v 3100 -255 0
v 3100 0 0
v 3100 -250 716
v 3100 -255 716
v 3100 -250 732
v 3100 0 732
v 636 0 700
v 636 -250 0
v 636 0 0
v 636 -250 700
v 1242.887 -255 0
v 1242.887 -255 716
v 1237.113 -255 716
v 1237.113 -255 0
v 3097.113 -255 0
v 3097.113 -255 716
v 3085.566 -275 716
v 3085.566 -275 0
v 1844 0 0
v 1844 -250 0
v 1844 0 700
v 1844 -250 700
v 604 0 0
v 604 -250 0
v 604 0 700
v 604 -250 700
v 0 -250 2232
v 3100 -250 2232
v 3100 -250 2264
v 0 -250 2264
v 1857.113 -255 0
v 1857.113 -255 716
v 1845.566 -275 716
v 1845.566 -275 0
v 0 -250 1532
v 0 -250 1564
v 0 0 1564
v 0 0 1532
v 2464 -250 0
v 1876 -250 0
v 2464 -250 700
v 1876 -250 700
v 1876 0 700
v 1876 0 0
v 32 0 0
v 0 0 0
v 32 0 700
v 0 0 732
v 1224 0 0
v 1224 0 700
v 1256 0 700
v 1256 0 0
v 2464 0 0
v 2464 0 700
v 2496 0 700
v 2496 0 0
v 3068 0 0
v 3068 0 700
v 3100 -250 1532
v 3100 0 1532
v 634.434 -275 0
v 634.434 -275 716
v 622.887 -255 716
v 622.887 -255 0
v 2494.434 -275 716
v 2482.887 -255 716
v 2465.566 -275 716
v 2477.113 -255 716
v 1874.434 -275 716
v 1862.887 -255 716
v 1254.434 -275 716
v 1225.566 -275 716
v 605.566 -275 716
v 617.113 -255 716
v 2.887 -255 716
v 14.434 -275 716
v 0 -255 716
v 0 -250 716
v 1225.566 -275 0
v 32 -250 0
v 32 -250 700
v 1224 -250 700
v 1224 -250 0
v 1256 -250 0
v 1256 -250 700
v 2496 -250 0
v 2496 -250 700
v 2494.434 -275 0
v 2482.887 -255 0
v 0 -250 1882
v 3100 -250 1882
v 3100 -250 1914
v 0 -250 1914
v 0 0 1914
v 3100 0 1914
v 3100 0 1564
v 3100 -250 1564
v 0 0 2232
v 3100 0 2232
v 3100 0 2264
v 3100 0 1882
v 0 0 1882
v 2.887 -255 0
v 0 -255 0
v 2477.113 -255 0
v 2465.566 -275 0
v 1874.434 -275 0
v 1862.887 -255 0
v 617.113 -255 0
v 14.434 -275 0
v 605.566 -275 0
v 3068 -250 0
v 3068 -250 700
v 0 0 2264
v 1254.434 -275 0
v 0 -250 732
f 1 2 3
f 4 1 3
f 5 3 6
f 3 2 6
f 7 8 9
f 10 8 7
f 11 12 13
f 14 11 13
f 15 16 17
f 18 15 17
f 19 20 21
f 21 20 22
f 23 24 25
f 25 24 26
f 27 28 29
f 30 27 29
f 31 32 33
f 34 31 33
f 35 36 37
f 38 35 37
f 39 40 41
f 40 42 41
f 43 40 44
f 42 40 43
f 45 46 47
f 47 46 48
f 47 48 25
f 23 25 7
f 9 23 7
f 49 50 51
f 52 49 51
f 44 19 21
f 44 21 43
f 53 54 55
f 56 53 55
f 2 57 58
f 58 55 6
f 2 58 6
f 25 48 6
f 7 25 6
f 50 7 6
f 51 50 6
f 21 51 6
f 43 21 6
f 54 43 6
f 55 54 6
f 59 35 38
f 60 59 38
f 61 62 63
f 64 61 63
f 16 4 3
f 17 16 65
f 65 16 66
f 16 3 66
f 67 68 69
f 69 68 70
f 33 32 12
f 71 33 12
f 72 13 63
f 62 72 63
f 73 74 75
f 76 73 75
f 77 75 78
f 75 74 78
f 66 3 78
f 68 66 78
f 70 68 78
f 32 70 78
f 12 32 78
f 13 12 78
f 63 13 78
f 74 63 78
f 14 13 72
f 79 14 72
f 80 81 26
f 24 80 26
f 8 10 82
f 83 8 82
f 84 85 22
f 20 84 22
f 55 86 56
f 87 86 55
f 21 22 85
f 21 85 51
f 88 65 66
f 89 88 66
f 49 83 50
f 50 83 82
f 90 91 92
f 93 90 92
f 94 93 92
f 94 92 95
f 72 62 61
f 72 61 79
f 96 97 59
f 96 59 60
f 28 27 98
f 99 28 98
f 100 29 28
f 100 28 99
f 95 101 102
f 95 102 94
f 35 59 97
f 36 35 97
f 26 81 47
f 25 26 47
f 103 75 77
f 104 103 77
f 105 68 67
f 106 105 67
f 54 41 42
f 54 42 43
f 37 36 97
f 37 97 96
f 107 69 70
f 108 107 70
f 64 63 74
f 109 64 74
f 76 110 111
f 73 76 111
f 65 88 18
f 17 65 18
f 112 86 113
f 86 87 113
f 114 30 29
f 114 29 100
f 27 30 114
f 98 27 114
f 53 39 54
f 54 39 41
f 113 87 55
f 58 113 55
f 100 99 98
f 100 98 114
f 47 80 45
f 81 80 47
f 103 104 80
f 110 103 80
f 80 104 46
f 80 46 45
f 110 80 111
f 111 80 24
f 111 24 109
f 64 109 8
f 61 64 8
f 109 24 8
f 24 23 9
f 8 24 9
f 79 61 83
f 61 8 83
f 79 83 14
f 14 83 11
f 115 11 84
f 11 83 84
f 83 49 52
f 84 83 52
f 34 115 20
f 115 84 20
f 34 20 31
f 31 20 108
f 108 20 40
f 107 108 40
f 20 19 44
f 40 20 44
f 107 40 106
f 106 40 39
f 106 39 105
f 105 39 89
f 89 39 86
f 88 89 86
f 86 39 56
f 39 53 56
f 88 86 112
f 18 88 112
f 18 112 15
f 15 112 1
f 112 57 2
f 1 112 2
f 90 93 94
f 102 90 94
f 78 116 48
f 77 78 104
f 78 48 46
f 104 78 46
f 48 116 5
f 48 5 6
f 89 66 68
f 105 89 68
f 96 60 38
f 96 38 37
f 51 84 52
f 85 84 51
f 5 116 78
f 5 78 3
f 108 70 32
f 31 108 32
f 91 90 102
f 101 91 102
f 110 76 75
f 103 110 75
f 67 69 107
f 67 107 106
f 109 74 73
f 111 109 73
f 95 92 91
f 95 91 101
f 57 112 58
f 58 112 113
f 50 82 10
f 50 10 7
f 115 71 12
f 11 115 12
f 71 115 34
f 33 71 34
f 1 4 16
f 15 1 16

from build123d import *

# Parameters (mm, degrees)
F0_W     = 250
F0_H     = 32
F1_DEPTH = 3100
F2_W     = 32
F2_H     = 700
F2_W_2   = 16
F3_DEPTH = 250
F2_H_2   = 16
F2_W_3   = 572
F2_W_4   = 588
F4_DEPTH = 25
F6_DEPTH = 716


with BuildPart() as f1:
    # F0 (on Right) → F1 (new body)
    with BuildSketch(Plane.YZ):
        with Locations((-125, 716)):
            Rectangle(F0_W, F0_H)
    extrude(amount=F1_DEPTH)

    # F2 (on face) → F3 (join, through all)
    with BuildSketch(Plane.XZ.offset(250)):
        with Locations((16, 350)):
            Rectangle(F2_W, F2_H)
        with Locations((612, 350)):
            Rectangle(F2_W_2, F2_H)
        with Locations((628, 350)):
            Rectangle(F2_W_2, F2_H)
        with Locations((1232, 350)):
            Rectangle(F2_W_2, F2_H)
        with Locations((1248, 350)):
            Rectangle(F2_W_2, F2_H)
        with Locations((1868, 350)):
            Rectangle(F2_W_2, F2_H)
        with Locations((1852, 350)):
            Rectangle(F2_W_2, F2_H)
        with Locations((2488, 350)):
            Rectangle(F2_W_2, F2_H)
        with Locations((2472, 350)):
            Rectangle(F2_W_2, F2_H)
        with Locations((3084, 350)):
            Rectangle(F2_W, F2_H)
    extrude(amount=-F3_DEPTH)

    # F2 (on face) → F4 (join)
    with BuildSketch(Plane.XZ.offset(250)):
        with Locations((16, 350)):
            Rectangle(F2_W, F2_H)
        with Locations((16, 708)):
            Rectangle(F2_W, F2_H_2)
        with Locations((318, 708)):
            Rectangle(F2_W_3, F2_H_2)
        with Locations((318, 350)):
            Rectangle(F2_W_3, F2_H)
        with Locations((612, 350)):
            Rectangle(F2_W_2, F2_H)
        with Locations((612, 708)):
            Rectangle(F2_W_2, F2_H_2)
        with Locations((930, 350)):
            Rectangle(F2_W_4, F2_H)
        with Locations((628, 350)):
            Rectangle(F2_W_2, F2_H)
        with Locations((628, 708)):
            Rectangle(F2_W_2, F2_H_2)
        with Locations((930, 708)):
            Rectangle(F2_W_4, F2_H_2)
        with Locations((1232, 708)):
            Rectangle(F2_W_2, F2_H_2)
        with Locations((1232, 350)):
            Rectangle(F2_W_2, F2_H)
        with Locations((1248, 350)):
            Rectangle(F2_W_2, F2_H)
        with Locations((1248, 708)):
            Rectangle(F2_W_2, F2_H_2)
        with Locations((1550, 708)):
            Rectangle(F2_W_4, F2_H_2)
        with Locations((1550, 350)):
            Rectangle(F2_W_4, F2_H)
        with Locations((1852, 708)):
            Rectangle(F2_W_2, F2_H_2)
        with Locations((1852, 350)):
            Rectangle(F2_W_2, F2_H)
        with Locations((1868, 350)):
            Rectangle(F2_W_2, F2_H)
        with Locations((1868, 708)):
            Rectangle(F2_W_2, F2_H_2)
        with Locations((2170, 708)):
            Rectangle(F2_W_4, F2_H_2)
        with Locations((2170, 350)):
            Rectangle(F2_W_4, F2_H)
        with Locations((2472, 708)):
            Rectangle(F2_W_2, F2_H_2)
        with Locations((2472, 350)):
            Rectangle(F2_W_2, F2_H)
        with Locations((2488, 350)):
            Rectangle(F2_W_2, F2_H)
        with Locations((2488, 708)):
            Rectangle(F2_W_2, F2_H_2)
        with Locations((2782, 708)):
            Rectangle(F2_W_3, F2_H_2)
        with Locations((2782, 350)):
            Rectangle(F2_W_3, F2_H)
        with Locations((3084, 350)):
            Rectangle(F2_W, F2_H)
        with Locations((3084, 708)):
            Rectangle(F2_W, F2_H_2)
    extrude(amount=F4_DEPTH)

    # F5 (on face) → F6 (cut, through all)
    with BuildSketch(Plane.XY.offset(716)):
        Polygon((14.4337567297, -275), (2.8867513459, -255), (0, -255), (0, -275), align=None)
        Polygon((634.4337567297, -275), (622.8867513459, -255), (617.1132486541, -255), (605.5662432703, -275), align=None)
        Polygon((1254.4337567297, -275), (1242.8867513459, -255), (1237.1132486541, -255), (1225.5662432703, -275), align=None)
        Polygon((1874.4337567297, -275), (1862.8867513459, -255), (1857.1132486541, -255), (1845.5662432703, -275), align=None)
        Polygon((2494.4337567297, -275), (2482.8867513459, -255), (2477.1132486541, -255), (2465.5662432703, -275), align=None)
        Polygon((3100, -255), (3097.1132486541, -255), (3085.5662432703, -275), (3100, -275), align=None)
    extrude(amount=-F6_DEPTH, mode=Mode.SUBTRACT)


with BuildPart() as f1b:
    # F0 (on Right) → F1, piece 2 (new body)
    with BuildSketch(Plane.YZ):
        with Locations((-125, 1548)):
            Rectangle(F0_W, F0_H)
    extrude(amount=F1_DEPTH)


with BuildPart() as f1c:
    # F0 (on Right) → F1, piece 3 (new body)
    with BuildSketch(Plane.YZ):
        with Locations((-125, 2248)):
            Rectangle(F0_W, F0_H)
    extrude(amount=F1_DEPTH)


with BuildPart() as f1d:
    # F0 (on Right) → F1, piece 4 (new body)
    with BuildSketch(Plane.YZ):
        with Locations((-125, 1898)):
            Rectangle(F0_W, F0_H)
    extrude(amount=F1_DEPTH)


solid = Compound([f1.part, f1b.part, f1c.part, f1d.part])
